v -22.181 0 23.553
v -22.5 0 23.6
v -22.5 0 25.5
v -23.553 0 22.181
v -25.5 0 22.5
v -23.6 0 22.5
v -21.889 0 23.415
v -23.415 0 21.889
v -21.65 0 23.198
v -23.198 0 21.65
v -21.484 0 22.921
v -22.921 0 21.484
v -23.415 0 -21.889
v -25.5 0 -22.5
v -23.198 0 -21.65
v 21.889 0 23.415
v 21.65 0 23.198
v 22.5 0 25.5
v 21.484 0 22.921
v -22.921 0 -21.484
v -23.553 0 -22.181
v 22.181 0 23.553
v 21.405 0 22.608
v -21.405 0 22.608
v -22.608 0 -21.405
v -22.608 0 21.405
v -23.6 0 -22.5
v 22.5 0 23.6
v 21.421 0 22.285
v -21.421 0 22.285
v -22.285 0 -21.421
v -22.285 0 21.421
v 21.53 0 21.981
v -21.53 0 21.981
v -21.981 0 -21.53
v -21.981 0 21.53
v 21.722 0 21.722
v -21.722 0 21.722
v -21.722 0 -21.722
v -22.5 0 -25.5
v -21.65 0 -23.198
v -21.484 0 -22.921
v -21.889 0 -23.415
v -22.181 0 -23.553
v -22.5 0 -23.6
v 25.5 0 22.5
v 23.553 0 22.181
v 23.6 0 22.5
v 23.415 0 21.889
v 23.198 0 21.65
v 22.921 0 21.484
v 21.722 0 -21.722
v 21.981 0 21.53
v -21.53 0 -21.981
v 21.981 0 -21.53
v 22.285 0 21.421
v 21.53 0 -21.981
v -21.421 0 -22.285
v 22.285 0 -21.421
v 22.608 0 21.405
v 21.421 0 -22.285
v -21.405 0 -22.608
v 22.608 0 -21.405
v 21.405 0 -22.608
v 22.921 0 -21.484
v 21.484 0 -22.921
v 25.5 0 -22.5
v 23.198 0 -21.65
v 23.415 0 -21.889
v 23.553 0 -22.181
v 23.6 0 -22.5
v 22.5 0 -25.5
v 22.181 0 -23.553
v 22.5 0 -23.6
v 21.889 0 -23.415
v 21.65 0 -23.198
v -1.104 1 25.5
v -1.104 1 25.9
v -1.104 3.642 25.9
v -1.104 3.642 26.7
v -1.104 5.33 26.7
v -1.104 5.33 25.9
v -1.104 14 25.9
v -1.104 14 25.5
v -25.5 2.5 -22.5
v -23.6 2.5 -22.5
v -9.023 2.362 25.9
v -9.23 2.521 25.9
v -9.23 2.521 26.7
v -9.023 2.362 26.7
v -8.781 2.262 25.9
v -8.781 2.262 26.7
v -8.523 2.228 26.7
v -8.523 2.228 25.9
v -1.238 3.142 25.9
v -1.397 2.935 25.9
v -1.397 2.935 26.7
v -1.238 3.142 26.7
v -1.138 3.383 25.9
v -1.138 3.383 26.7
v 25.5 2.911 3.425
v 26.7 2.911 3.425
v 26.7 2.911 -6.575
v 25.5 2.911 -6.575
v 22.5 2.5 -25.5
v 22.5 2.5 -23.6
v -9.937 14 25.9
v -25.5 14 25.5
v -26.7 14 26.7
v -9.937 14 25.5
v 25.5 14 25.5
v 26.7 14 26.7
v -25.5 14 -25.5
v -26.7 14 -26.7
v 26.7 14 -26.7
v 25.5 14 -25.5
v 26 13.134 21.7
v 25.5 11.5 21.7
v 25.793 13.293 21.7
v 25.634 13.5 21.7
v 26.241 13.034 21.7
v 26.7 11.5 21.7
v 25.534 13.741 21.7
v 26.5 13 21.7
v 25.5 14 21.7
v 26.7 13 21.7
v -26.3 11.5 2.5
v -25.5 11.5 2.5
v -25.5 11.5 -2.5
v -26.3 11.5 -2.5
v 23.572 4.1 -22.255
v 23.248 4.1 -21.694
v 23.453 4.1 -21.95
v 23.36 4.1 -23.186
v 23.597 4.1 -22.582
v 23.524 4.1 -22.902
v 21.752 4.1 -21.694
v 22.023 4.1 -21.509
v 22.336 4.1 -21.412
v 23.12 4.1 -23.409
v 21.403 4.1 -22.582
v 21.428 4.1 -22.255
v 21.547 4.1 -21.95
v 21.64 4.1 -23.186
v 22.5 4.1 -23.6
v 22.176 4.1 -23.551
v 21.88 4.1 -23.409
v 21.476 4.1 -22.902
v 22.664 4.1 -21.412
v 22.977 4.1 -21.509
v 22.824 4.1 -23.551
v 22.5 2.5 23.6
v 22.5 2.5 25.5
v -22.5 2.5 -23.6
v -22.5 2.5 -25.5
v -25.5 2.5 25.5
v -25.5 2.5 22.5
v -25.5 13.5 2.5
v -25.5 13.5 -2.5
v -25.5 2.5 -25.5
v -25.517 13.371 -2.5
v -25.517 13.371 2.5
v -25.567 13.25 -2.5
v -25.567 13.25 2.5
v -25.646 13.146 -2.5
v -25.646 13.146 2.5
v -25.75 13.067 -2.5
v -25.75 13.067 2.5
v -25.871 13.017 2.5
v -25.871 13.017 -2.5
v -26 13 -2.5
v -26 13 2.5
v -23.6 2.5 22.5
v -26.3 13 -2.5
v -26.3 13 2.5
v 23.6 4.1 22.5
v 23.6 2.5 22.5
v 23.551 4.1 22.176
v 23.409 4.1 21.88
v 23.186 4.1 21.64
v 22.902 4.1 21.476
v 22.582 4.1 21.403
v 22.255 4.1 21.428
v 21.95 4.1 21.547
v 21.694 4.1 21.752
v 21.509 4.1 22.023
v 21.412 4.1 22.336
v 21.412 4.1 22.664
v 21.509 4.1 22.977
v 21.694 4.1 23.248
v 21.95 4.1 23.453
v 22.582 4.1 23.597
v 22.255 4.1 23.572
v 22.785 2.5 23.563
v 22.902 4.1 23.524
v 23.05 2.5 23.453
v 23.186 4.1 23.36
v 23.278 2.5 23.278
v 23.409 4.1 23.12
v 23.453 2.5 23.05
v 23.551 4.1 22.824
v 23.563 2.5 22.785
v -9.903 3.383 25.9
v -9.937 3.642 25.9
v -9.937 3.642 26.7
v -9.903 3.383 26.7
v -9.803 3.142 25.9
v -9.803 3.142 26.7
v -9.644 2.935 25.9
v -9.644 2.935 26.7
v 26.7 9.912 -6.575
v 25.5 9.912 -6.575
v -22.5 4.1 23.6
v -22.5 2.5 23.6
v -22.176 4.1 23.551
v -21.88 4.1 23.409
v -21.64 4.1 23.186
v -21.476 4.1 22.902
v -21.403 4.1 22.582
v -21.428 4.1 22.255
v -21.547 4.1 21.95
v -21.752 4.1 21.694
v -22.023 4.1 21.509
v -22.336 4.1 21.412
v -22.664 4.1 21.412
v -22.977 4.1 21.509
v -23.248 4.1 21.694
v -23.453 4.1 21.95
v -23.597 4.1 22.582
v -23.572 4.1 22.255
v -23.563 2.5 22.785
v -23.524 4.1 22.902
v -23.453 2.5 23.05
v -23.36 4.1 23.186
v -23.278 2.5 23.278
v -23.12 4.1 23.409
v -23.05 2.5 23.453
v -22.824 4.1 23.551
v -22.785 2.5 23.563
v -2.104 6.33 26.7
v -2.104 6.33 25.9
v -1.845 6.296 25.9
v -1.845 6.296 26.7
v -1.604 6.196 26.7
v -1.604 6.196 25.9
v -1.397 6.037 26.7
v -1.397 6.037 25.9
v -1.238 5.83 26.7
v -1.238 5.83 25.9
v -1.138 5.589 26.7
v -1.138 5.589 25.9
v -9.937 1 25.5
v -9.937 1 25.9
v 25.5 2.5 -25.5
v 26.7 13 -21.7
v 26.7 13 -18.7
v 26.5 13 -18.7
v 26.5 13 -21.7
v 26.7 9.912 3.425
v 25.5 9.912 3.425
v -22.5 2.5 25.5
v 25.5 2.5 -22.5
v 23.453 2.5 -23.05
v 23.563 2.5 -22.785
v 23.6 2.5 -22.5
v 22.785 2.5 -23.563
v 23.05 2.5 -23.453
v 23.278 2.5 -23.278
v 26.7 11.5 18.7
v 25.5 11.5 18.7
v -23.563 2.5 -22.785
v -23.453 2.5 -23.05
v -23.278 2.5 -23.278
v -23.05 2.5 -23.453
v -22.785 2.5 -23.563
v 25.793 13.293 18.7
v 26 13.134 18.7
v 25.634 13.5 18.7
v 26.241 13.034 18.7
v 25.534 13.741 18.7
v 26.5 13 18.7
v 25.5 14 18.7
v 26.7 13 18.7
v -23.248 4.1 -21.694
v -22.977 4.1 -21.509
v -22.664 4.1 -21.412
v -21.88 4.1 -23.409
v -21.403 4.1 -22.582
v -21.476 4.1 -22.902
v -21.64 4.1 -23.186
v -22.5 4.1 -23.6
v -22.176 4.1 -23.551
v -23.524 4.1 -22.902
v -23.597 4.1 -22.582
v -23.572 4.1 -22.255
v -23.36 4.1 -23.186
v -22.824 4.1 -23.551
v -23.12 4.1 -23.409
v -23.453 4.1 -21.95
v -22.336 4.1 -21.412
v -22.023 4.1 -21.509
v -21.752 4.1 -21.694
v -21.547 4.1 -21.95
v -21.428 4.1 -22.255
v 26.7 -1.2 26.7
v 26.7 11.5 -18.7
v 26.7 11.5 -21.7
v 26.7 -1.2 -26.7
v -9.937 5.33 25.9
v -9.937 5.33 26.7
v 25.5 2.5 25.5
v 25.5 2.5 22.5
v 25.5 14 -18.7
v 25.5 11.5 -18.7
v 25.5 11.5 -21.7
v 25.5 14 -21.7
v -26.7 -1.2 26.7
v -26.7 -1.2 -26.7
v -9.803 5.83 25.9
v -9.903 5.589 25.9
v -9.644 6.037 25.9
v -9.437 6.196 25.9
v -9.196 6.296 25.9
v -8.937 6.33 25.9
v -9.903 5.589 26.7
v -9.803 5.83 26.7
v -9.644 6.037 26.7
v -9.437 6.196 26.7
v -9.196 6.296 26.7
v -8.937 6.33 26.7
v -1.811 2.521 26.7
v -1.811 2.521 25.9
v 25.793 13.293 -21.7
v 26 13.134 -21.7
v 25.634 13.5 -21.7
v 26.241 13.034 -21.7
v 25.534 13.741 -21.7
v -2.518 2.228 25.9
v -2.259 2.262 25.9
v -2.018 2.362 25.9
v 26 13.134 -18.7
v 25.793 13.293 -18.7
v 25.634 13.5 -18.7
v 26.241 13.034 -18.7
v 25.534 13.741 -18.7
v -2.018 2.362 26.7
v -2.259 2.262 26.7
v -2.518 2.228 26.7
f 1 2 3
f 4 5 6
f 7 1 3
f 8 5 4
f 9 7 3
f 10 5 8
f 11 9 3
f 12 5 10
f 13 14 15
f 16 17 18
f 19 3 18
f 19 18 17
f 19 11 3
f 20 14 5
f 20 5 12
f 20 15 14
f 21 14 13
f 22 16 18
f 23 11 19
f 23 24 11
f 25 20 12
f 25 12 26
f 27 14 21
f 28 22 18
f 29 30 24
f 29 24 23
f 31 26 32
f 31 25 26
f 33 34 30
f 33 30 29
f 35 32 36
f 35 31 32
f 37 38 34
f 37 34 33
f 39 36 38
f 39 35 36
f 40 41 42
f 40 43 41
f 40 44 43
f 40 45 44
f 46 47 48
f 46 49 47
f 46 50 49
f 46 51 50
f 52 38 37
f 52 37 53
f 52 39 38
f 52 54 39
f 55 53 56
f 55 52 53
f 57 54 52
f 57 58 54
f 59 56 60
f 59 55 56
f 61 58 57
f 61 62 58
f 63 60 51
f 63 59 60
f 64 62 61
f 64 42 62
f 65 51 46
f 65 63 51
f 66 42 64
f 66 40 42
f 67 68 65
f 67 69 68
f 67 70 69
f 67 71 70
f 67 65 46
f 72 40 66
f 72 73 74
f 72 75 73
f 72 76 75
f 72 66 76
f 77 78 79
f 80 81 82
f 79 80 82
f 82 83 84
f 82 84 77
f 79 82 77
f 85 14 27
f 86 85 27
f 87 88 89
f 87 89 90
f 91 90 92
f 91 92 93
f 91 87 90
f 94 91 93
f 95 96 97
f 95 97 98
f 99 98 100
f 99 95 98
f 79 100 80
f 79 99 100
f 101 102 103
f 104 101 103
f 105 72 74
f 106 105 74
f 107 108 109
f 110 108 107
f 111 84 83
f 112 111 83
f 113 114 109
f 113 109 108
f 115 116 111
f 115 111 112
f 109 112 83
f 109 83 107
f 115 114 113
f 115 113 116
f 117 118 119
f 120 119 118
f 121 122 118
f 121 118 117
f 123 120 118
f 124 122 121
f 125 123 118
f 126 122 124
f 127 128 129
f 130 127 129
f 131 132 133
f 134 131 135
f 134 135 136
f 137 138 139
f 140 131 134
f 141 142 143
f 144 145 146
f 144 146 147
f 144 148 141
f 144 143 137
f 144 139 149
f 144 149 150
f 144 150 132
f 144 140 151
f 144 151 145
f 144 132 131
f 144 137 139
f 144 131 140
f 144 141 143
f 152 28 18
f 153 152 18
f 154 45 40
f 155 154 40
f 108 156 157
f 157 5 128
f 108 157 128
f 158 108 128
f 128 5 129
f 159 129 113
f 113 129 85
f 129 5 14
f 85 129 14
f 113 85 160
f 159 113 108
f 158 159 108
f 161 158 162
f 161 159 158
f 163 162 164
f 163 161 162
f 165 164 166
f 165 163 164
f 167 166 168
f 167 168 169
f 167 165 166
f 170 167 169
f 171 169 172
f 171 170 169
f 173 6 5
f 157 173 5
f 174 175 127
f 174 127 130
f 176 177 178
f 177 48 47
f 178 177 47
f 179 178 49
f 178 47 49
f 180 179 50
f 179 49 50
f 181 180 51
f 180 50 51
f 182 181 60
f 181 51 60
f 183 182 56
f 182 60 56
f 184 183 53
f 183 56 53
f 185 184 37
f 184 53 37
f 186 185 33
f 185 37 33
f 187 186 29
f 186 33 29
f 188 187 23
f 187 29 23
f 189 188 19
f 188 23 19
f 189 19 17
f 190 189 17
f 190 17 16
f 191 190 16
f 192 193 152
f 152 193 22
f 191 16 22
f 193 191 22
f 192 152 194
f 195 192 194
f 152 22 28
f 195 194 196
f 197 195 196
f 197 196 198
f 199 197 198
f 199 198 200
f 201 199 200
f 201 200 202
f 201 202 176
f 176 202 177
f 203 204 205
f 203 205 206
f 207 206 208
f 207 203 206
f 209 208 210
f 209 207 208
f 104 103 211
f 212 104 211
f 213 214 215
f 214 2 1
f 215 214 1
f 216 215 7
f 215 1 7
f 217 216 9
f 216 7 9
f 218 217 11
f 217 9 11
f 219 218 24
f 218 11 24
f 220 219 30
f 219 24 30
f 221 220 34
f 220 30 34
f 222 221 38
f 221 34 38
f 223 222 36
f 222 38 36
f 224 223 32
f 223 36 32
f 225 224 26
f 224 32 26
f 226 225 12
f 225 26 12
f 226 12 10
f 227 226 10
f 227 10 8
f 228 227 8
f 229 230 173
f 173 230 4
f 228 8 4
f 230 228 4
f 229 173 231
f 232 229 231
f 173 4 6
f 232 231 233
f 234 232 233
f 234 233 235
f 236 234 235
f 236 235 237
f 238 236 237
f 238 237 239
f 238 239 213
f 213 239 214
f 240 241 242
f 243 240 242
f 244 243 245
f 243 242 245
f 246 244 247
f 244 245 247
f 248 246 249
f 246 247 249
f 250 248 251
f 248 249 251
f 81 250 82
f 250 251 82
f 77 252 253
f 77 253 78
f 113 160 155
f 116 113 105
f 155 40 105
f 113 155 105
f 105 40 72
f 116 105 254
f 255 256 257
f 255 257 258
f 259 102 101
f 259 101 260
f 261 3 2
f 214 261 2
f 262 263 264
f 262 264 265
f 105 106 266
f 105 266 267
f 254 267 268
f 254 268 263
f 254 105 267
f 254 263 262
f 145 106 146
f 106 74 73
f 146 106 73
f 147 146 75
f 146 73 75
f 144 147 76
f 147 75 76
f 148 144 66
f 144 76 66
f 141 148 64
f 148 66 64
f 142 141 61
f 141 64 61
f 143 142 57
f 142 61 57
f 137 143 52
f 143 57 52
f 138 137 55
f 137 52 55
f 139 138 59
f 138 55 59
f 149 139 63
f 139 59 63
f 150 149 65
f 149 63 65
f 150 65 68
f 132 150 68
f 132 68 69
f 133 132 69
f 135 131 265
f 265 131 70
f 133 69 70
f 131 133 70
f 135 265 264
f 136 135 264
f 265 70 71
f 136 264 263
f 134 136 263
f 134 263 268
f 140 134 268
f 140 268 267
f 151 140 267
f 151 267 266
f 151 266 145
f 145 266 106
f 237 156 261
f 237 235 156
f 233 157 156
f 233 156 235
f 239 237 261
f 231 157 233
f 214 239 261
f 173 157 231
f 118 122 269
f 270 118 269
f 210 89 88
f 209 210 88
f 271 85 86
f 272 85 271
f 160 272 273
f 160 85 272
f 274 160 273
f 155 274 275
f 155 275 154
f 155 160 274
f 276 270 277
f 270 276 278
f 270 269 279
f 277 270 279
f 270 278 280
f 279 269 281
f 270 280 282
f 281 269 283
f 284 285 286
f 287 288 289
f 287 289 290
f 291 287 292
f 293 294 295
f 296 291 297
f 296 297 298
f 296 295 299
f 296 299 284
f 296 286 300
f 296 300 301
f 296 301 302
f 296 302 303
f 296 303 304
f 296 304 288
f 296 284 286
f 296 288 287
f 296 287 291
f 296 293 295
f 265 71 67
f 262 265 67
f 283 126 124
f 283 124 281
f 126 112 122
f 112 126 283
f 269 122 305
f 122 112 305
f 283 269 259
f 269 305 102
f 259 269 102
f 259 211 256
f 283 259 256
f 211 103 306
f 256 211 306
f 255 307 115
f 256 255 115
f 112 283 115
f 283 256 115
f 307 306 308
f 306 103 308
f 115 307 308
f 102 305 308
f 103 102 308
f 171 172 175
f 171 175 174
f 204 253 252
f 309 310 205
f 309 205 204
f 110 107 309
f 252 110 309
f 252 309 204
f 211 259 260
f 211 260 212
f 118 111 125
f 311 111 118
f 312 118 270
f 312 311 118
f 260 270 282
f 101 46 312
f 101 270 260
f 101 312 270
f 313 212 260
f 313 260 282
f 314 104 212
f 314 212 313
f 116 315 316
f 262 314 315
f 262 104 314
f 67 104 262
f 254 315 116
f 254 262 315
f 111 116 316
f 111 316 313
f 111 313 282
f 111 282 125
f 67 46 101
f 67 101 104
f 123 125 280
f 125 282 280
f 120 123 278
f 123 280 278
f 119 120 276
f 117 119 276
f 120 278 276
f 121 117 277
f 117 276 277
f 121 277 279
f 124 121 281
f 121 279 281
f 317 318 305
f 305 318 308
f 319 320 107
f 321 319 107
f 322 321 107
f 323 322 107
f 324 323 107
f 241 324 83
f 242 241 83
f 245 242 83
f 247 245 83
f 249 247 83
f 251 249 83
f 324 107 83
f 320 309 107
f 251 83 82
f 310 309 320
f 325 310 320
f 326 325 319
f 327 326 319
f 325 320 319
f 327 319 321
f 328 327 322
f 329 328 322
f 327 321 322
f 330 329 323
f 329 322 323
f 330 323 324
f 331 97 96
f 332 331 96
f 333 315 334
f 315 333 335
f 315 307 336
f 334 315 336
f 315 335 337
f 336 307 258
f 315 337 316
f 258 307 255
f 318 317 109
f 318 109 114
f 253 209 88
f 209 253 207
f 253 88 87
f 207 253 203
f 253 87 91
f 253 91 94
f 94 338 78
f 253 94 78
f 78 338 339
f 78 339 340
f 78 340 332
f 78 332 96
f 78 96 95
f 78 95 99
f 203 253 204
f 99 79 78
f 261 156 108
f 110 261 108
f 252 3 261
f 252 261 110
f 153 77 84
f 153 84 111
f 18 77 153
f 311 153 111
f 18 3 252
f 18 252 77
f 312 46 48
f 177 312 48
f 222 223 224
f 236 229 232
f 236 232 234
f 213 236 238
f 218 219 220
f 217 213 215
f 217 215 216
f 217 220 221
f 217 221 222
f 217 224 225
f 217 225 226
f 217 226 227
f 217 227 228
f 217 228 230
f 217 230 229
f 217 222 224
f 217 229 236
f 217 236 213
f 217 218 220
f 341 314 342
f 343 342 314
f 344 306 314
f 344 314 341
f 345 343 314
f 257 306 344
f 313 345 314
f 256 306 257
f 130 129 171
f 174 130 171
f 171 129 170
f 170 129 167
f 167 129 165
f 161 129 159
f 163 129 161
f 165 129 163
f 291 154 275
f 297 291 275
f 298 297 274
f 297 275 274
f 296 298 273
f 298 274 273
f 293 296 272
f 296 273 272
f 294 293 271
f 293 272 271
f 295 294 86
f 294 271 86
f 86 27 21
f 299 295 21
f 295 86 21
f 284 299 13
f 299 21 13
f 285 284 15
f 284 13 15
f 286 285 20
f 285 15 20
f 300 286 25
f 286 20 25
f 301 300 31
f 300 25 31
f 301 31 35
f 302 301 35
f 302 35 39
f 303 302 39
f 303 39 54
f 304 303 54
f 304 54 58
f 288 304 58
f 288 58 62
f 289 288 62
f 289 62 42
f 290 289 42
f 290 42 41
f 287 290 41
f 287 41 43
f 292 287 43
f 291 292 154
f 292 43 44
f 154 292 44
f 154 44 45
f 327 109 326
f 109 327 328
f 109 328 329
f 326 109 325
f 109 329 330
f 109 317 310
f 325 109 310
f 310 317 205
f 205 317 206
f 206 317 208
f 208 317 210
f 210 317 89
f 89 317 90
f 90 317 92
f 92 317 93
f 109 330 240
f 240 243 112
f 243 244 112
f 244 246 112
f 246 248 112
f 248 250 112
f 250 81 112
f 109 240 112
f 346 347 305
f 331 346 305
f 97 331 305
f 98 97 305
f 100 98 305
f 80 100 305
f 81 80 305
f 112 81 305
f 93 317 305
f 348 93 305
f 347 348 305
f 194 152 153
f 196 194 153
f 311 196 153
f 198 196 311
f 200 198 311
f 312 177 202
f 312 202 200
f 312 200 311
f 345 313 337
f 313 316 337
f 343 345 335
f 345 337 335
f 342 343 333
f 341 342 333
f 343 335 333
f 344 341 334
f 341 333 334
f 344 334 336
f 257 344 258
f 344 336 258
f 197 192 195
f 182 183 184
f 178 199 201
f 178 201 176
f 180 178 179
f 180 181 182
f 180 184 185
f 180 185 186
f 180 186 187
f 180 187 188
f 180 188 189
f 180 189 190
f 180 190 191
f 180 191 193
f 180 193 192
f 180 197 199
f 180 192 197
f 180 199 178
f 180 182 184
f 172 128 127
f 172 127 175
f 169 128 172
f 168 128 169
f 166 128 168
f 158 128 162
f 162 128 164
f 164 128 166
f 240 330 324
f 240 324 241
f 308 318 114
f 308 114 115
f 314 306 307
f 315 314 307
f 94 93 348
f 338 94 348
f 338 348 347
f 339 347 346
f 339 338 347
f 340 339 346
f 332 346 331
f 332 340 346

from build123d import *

# Parameters (mm, degrees)
SKETCH1_W           = 51
SKETCH1_H           = 51
BOSS_EXTRUDE1_DEPTH = 14
SHELL1_T            = 1.2
CUT_EXTRUDE1_REACH  = 63.323
SKETCH3_W           = 8.833103678
SKETCH3_H           = 4.102185467
FILLET1_R           = 1
CHAMFER1_SIZE       = 1
FILLET2_R           = 1
BOSS_EXTRUDE2_DEPTH = 2.5
SKETCH4_3_R         = 1.09999934
BOSS_EXTRUDE3_DEPTH = 4.1
CUT_EXTRUDE3_REACH  = 63.323
SKETCH8_W           = 3
SKETCH8_H           = 1.5
FILLET3_R           = 1
SKETCH9_W           = 5
SKETCH9_H           = 1.5
CUT_EXTRUDE4_DEPTH  = 0.8
FILLET4_R           = 0.5
CUT_EXTRUDE5_REACH  = 63.323
SKETCH10_W          = 10
SKETCH10_H          = 7.000137798
SKETCH14_W          = 8.833103678
SKETCH14_H          = 0.4
CUT_EXTRUDE6_DEPTH  = 13


# Read off the part's stored shape, not the designer's step: Boss-Extrude2
with BuildPart() as part:
    # Sketch1 → Boss-Extrude1 (new body)
    with BuildSketch(Plane(origin=(0, 0, 0), x_dir=(1, 0, 0), z_dir=(0, 1, 0))):
        Rectangle(SKETCH1_W, SKETCH1_H)
    extrude(amount=BOSS_EXTRUDE1_DEPTH)

    # Shell1
    shell1_openings = [part.faces().sort_by_distance(p)[0] for p in [
        (0, 14, 0),
    ]]
    offset(amount=SHELL1_T, openings=shell1_openings, kind=Kind.INTERSECTION)

    # Sketch3 → Cut-Extrude1 (cut, up to next)
    with BuildSketch(Plane.XY.offset(26.7), mode=Mode.PRIVATE) as cut_extrude1_sk1:
        with Locations((-5.520237079, 4.278939715)):
            Rectangle(SKETCH3_W, SKETCH3_H)
    cut_extrude1_tool1 = extrude(cut_extrude1_sk1.sketch, amount=-CUT_EXTRUDE1_REACH, mode=Mode.PRIVATE) & part.part
    add(cut_extrude1_tool1.solids().sort_by_distance((-5.520237, 4.27894, 26.7))[0], mode=Mode.SUBTRACT)

    # Fillet1
    fillet1_edges = [part.edges().sort_by_distance(p)[0] for p in [
        (-1.10368524, 6.330032448, 26.1),
        (-9.936788918, 6.330032448, 26.1),
    ]]
    fillet(fillet1_edges, radius=FILLET1_R)

    # Chamfer1
    chamfer1_edges = [part.edges().sort_by_distance(p)[0] for p in [
        (-1.10368524, 2.227846981, 26.1),
        (-9.936788918, 2.227846981, 26.1),
    ]]
    chamfer(chamfer1_edges, length=CHAMFER1_SIZE)

    # Fillet2
    fillet2_edges = [part.edges().sort_by_distance(p)[0] for p in [
        (-1.10368524, 3.227846981, 26.1),
        (-8.936788918, 2.227846981, 26.1),
        (-2.10368524, 2.227846981, 26.1),
        (-9.936788918, 3.227846981, 26.1),
    ]]
    fillet(fillet2_edges, radius=FILLET2_R)

    # Boss-Extrude2 outline → Boss-Extrude2 (add)
    with BuildSketch(Plane(origin=(0, 0, 0), x_dir=(1, 0, 0), z_dir=(0, 1, 0))):
        with BuildLine():
            Line((25.5, 25.5), (22.50000961, 25.5))
            Line((22.50000961, 25.5), (22.50000961, 23.60000133))
            ThreePointArc((22.50000961, 23.60000133), (23.277821677, 23.277816289), (23.60000133, 22.50000199))
            Line((23.60000133, 22.50000199), (25.5, 22.50000199))
            Line((25.5, 22.50000199), (25.5, 25.5))
        make_face()
        with BuildLine():
            Line((-22.50000961, 23.60000133), (-22.50000961, 25.5))
            Line((-22.50000961, 25.5), (-25.5, 25.5))
            Line((-25.5, 25.5), (-25.5, 22.50000199))
            Line((-25.5, 22.50000199), (-23.60000895, 22.50000199))
            ThreePointArc((-23.60000895, 22.50000199), (-23.277826603, 23.277818983), (-22.50000961, 23.60000133))
        make_face()
        with BuildLine():
            Line((25.5, -25.5), (25.5, -22.50000199))
            Line((25.5, -22.50000199), (23.60000133, -22.50000199))
            ThreePointArc((23.60000133, -22.50000199), (23.277824371, -23.277821214), (22.50000961, -23.60000895))
            Line((22.50000961, -23.60000895), (22.50000961, -25.5))
            Line((22.50000961, -25.5), (25.5, -25.5))
        make_face()
        with BuildLine():
            Line((-23.60000895, -22.50000199), (-25.5, -22.50000199))
            Line((-25.5, -22.50000199), (-25.5, -25.5))
            Line((-25.5, -25.5), (-22.50000961, -25.5))
            Line((-22.50000961, -25.5), (-22.50000961, -23.60000895))
            ThreePointArc((-22.50000961, -23.60000895), (-23.277829297, -23.277823909), (-23.60000895, -22.50000199))
        make_face()
    extrude(amount=BOSS_EXTRUDE2_DEPTH)

    # Sketch4<3> → Boss-Extrude3 (add)
    with BuildSketch(Plane(origin=(0, 0, 0), x_dir=(1, 0, 0), z_dir=(0, 1, 0))):
        with Locations(Location((-22.50000961, 22.50000199, 0), (0, 0, 90))):
            Circle(SKETCH4_3_R)
        with Locations(Location((22.50000199, 22.50000199, 0), (0, 0, 89.999603096))):
            Circle(SKETCH4_3_R)
        with Locations(Location((22.50000199, -22.50000961, 0), (0, 0, 0.000396902))):
            Circle(SKETCH4_3_R)
        with Locations(Location((-22.50000961, -22.50000961, 0), (0, 0, 270))):
            Circle(SKETCH4_3_R)
    extrude(amount=BOSS_EXTRUDE3_DEPTH)

    # Sketch8 → Cut-Extrude3 (cut, up to next)
    with BuildSketch(Plane(origin=(26.7, 0, 0), x_dir=(0, 0, -1), z_dir=(1, 0, 0)), mode=Mode.PRIVATE) as cut_extrude3_sk1:
        with Locations((-20.2, 12.25)):
            Rectangle(SKETCH8_W, SKETCH8_H)
    cut_extrude3_tool1 = extrude(cut_extrude3_sk1.sketch, amount=-CUT_EXTRUDE3_REACH, mode=Mode.PRIVATE) & part.part
    # Sketch8 → Cut-Extrude3 (cut, up to next)
    with BuildSketch(Plane(origin=(26.7, 0, 0), x_dir=(0, 0, -1), z_dir=(1, 0, 0)), mode=Mode.PRIVATE) as cut_extrude3_sk2:
        with Locations((20.2, 12.25)):
            Rectangle(SKETCH8_W, SKETCH8_H)
    cut_extrude3_tool2 = extrude(cut_extrude3_sk2.sketch, amount=-CUT_EXTRUDE3_REACH, mode=Mode.PRIVATE) & part.part
    add(cut_extrude3_tool1.solids().sort_by_distance((26.7, 12.25, 20.2))[0], mode=Mode.SUBTRACT)
    add(cut_extrude3_tool2.solids().sort_by_distance((26.7, 12.25, -20.2))[0], mode=Mode.SUBTRACT)

    # Fillet3
    fillet3_edges = [part.edges().sort_by_distance(p)[0] for p in [
        (25.5, 13, 20.2),
        (25.5, 13, -20.2),
    ]]
    fillet(fillet3_edges, radius=FILLET3_R - 0.0001)  # a hair under: the kernel refuses the full size

    # Sketch9 → Cut-Extrude4 (cut)
    with BuildSketch(Plane(origin=(-25.5, 0, 0), x_dir=(0, 0, -1), z_dir=(1, 0, 0))):
        with Locations((0, 12.25)):
            Rectangle(SKETCH9_W, SKETCH9_H)
    extrude(amount=-CUT_EXTRUDE4_DEPTH, mode=Mode.SUBTRACT)

    # Fillet4
    fillet4_edges = [part.edges().sort_by_distance(p)[0] for p in [
        (-25.5, 13, 0),
    ]]
    fillet(fillet4_edges, radius=FILLET4_R)

    # Sketch10 → Cut-Extrude5 (cut, up to next)
    with BuildSketch(Plane(origin=(26.7, 0, 0), x_dir=(0, 0, -1), z_dir=(1, 0, 0)), mode=Mode.PRIVATE) as cut_extrude5_sk1:
        with Locations((1.575065653, 6.411548449)):
            Rectangle(SKETCH10_W, SKETCH10_H)
    cut_extrude5_tool1 = extrude(cut_extrude5_sk1.sketch, amount=-CUT_EXTRUDE5_REACH, mode=Mode.PRIVATE) & part.part
    add(cut_extrude5_tool1.solids().sort_by_distance((26.7, 6.411548, -1.575066))[0], mode=Mode.SUBTRACT)

    # Sketch14 → Cut-Extrude6 (cut)
    with BuildSketch(Plane(origin=(0, 14, 0), x_dir=(1, 0, 0), z_dir=(0, 1, 0))):
        with Locations((-5.520237079, -25.7)):
            Rectangle(SKETCH14_W, SKETCH14_H)
    extrude(amount=-CUT_EXTRUDE6_DEPTH, mode=Mode.SUBTRACT)


solid = part.part
